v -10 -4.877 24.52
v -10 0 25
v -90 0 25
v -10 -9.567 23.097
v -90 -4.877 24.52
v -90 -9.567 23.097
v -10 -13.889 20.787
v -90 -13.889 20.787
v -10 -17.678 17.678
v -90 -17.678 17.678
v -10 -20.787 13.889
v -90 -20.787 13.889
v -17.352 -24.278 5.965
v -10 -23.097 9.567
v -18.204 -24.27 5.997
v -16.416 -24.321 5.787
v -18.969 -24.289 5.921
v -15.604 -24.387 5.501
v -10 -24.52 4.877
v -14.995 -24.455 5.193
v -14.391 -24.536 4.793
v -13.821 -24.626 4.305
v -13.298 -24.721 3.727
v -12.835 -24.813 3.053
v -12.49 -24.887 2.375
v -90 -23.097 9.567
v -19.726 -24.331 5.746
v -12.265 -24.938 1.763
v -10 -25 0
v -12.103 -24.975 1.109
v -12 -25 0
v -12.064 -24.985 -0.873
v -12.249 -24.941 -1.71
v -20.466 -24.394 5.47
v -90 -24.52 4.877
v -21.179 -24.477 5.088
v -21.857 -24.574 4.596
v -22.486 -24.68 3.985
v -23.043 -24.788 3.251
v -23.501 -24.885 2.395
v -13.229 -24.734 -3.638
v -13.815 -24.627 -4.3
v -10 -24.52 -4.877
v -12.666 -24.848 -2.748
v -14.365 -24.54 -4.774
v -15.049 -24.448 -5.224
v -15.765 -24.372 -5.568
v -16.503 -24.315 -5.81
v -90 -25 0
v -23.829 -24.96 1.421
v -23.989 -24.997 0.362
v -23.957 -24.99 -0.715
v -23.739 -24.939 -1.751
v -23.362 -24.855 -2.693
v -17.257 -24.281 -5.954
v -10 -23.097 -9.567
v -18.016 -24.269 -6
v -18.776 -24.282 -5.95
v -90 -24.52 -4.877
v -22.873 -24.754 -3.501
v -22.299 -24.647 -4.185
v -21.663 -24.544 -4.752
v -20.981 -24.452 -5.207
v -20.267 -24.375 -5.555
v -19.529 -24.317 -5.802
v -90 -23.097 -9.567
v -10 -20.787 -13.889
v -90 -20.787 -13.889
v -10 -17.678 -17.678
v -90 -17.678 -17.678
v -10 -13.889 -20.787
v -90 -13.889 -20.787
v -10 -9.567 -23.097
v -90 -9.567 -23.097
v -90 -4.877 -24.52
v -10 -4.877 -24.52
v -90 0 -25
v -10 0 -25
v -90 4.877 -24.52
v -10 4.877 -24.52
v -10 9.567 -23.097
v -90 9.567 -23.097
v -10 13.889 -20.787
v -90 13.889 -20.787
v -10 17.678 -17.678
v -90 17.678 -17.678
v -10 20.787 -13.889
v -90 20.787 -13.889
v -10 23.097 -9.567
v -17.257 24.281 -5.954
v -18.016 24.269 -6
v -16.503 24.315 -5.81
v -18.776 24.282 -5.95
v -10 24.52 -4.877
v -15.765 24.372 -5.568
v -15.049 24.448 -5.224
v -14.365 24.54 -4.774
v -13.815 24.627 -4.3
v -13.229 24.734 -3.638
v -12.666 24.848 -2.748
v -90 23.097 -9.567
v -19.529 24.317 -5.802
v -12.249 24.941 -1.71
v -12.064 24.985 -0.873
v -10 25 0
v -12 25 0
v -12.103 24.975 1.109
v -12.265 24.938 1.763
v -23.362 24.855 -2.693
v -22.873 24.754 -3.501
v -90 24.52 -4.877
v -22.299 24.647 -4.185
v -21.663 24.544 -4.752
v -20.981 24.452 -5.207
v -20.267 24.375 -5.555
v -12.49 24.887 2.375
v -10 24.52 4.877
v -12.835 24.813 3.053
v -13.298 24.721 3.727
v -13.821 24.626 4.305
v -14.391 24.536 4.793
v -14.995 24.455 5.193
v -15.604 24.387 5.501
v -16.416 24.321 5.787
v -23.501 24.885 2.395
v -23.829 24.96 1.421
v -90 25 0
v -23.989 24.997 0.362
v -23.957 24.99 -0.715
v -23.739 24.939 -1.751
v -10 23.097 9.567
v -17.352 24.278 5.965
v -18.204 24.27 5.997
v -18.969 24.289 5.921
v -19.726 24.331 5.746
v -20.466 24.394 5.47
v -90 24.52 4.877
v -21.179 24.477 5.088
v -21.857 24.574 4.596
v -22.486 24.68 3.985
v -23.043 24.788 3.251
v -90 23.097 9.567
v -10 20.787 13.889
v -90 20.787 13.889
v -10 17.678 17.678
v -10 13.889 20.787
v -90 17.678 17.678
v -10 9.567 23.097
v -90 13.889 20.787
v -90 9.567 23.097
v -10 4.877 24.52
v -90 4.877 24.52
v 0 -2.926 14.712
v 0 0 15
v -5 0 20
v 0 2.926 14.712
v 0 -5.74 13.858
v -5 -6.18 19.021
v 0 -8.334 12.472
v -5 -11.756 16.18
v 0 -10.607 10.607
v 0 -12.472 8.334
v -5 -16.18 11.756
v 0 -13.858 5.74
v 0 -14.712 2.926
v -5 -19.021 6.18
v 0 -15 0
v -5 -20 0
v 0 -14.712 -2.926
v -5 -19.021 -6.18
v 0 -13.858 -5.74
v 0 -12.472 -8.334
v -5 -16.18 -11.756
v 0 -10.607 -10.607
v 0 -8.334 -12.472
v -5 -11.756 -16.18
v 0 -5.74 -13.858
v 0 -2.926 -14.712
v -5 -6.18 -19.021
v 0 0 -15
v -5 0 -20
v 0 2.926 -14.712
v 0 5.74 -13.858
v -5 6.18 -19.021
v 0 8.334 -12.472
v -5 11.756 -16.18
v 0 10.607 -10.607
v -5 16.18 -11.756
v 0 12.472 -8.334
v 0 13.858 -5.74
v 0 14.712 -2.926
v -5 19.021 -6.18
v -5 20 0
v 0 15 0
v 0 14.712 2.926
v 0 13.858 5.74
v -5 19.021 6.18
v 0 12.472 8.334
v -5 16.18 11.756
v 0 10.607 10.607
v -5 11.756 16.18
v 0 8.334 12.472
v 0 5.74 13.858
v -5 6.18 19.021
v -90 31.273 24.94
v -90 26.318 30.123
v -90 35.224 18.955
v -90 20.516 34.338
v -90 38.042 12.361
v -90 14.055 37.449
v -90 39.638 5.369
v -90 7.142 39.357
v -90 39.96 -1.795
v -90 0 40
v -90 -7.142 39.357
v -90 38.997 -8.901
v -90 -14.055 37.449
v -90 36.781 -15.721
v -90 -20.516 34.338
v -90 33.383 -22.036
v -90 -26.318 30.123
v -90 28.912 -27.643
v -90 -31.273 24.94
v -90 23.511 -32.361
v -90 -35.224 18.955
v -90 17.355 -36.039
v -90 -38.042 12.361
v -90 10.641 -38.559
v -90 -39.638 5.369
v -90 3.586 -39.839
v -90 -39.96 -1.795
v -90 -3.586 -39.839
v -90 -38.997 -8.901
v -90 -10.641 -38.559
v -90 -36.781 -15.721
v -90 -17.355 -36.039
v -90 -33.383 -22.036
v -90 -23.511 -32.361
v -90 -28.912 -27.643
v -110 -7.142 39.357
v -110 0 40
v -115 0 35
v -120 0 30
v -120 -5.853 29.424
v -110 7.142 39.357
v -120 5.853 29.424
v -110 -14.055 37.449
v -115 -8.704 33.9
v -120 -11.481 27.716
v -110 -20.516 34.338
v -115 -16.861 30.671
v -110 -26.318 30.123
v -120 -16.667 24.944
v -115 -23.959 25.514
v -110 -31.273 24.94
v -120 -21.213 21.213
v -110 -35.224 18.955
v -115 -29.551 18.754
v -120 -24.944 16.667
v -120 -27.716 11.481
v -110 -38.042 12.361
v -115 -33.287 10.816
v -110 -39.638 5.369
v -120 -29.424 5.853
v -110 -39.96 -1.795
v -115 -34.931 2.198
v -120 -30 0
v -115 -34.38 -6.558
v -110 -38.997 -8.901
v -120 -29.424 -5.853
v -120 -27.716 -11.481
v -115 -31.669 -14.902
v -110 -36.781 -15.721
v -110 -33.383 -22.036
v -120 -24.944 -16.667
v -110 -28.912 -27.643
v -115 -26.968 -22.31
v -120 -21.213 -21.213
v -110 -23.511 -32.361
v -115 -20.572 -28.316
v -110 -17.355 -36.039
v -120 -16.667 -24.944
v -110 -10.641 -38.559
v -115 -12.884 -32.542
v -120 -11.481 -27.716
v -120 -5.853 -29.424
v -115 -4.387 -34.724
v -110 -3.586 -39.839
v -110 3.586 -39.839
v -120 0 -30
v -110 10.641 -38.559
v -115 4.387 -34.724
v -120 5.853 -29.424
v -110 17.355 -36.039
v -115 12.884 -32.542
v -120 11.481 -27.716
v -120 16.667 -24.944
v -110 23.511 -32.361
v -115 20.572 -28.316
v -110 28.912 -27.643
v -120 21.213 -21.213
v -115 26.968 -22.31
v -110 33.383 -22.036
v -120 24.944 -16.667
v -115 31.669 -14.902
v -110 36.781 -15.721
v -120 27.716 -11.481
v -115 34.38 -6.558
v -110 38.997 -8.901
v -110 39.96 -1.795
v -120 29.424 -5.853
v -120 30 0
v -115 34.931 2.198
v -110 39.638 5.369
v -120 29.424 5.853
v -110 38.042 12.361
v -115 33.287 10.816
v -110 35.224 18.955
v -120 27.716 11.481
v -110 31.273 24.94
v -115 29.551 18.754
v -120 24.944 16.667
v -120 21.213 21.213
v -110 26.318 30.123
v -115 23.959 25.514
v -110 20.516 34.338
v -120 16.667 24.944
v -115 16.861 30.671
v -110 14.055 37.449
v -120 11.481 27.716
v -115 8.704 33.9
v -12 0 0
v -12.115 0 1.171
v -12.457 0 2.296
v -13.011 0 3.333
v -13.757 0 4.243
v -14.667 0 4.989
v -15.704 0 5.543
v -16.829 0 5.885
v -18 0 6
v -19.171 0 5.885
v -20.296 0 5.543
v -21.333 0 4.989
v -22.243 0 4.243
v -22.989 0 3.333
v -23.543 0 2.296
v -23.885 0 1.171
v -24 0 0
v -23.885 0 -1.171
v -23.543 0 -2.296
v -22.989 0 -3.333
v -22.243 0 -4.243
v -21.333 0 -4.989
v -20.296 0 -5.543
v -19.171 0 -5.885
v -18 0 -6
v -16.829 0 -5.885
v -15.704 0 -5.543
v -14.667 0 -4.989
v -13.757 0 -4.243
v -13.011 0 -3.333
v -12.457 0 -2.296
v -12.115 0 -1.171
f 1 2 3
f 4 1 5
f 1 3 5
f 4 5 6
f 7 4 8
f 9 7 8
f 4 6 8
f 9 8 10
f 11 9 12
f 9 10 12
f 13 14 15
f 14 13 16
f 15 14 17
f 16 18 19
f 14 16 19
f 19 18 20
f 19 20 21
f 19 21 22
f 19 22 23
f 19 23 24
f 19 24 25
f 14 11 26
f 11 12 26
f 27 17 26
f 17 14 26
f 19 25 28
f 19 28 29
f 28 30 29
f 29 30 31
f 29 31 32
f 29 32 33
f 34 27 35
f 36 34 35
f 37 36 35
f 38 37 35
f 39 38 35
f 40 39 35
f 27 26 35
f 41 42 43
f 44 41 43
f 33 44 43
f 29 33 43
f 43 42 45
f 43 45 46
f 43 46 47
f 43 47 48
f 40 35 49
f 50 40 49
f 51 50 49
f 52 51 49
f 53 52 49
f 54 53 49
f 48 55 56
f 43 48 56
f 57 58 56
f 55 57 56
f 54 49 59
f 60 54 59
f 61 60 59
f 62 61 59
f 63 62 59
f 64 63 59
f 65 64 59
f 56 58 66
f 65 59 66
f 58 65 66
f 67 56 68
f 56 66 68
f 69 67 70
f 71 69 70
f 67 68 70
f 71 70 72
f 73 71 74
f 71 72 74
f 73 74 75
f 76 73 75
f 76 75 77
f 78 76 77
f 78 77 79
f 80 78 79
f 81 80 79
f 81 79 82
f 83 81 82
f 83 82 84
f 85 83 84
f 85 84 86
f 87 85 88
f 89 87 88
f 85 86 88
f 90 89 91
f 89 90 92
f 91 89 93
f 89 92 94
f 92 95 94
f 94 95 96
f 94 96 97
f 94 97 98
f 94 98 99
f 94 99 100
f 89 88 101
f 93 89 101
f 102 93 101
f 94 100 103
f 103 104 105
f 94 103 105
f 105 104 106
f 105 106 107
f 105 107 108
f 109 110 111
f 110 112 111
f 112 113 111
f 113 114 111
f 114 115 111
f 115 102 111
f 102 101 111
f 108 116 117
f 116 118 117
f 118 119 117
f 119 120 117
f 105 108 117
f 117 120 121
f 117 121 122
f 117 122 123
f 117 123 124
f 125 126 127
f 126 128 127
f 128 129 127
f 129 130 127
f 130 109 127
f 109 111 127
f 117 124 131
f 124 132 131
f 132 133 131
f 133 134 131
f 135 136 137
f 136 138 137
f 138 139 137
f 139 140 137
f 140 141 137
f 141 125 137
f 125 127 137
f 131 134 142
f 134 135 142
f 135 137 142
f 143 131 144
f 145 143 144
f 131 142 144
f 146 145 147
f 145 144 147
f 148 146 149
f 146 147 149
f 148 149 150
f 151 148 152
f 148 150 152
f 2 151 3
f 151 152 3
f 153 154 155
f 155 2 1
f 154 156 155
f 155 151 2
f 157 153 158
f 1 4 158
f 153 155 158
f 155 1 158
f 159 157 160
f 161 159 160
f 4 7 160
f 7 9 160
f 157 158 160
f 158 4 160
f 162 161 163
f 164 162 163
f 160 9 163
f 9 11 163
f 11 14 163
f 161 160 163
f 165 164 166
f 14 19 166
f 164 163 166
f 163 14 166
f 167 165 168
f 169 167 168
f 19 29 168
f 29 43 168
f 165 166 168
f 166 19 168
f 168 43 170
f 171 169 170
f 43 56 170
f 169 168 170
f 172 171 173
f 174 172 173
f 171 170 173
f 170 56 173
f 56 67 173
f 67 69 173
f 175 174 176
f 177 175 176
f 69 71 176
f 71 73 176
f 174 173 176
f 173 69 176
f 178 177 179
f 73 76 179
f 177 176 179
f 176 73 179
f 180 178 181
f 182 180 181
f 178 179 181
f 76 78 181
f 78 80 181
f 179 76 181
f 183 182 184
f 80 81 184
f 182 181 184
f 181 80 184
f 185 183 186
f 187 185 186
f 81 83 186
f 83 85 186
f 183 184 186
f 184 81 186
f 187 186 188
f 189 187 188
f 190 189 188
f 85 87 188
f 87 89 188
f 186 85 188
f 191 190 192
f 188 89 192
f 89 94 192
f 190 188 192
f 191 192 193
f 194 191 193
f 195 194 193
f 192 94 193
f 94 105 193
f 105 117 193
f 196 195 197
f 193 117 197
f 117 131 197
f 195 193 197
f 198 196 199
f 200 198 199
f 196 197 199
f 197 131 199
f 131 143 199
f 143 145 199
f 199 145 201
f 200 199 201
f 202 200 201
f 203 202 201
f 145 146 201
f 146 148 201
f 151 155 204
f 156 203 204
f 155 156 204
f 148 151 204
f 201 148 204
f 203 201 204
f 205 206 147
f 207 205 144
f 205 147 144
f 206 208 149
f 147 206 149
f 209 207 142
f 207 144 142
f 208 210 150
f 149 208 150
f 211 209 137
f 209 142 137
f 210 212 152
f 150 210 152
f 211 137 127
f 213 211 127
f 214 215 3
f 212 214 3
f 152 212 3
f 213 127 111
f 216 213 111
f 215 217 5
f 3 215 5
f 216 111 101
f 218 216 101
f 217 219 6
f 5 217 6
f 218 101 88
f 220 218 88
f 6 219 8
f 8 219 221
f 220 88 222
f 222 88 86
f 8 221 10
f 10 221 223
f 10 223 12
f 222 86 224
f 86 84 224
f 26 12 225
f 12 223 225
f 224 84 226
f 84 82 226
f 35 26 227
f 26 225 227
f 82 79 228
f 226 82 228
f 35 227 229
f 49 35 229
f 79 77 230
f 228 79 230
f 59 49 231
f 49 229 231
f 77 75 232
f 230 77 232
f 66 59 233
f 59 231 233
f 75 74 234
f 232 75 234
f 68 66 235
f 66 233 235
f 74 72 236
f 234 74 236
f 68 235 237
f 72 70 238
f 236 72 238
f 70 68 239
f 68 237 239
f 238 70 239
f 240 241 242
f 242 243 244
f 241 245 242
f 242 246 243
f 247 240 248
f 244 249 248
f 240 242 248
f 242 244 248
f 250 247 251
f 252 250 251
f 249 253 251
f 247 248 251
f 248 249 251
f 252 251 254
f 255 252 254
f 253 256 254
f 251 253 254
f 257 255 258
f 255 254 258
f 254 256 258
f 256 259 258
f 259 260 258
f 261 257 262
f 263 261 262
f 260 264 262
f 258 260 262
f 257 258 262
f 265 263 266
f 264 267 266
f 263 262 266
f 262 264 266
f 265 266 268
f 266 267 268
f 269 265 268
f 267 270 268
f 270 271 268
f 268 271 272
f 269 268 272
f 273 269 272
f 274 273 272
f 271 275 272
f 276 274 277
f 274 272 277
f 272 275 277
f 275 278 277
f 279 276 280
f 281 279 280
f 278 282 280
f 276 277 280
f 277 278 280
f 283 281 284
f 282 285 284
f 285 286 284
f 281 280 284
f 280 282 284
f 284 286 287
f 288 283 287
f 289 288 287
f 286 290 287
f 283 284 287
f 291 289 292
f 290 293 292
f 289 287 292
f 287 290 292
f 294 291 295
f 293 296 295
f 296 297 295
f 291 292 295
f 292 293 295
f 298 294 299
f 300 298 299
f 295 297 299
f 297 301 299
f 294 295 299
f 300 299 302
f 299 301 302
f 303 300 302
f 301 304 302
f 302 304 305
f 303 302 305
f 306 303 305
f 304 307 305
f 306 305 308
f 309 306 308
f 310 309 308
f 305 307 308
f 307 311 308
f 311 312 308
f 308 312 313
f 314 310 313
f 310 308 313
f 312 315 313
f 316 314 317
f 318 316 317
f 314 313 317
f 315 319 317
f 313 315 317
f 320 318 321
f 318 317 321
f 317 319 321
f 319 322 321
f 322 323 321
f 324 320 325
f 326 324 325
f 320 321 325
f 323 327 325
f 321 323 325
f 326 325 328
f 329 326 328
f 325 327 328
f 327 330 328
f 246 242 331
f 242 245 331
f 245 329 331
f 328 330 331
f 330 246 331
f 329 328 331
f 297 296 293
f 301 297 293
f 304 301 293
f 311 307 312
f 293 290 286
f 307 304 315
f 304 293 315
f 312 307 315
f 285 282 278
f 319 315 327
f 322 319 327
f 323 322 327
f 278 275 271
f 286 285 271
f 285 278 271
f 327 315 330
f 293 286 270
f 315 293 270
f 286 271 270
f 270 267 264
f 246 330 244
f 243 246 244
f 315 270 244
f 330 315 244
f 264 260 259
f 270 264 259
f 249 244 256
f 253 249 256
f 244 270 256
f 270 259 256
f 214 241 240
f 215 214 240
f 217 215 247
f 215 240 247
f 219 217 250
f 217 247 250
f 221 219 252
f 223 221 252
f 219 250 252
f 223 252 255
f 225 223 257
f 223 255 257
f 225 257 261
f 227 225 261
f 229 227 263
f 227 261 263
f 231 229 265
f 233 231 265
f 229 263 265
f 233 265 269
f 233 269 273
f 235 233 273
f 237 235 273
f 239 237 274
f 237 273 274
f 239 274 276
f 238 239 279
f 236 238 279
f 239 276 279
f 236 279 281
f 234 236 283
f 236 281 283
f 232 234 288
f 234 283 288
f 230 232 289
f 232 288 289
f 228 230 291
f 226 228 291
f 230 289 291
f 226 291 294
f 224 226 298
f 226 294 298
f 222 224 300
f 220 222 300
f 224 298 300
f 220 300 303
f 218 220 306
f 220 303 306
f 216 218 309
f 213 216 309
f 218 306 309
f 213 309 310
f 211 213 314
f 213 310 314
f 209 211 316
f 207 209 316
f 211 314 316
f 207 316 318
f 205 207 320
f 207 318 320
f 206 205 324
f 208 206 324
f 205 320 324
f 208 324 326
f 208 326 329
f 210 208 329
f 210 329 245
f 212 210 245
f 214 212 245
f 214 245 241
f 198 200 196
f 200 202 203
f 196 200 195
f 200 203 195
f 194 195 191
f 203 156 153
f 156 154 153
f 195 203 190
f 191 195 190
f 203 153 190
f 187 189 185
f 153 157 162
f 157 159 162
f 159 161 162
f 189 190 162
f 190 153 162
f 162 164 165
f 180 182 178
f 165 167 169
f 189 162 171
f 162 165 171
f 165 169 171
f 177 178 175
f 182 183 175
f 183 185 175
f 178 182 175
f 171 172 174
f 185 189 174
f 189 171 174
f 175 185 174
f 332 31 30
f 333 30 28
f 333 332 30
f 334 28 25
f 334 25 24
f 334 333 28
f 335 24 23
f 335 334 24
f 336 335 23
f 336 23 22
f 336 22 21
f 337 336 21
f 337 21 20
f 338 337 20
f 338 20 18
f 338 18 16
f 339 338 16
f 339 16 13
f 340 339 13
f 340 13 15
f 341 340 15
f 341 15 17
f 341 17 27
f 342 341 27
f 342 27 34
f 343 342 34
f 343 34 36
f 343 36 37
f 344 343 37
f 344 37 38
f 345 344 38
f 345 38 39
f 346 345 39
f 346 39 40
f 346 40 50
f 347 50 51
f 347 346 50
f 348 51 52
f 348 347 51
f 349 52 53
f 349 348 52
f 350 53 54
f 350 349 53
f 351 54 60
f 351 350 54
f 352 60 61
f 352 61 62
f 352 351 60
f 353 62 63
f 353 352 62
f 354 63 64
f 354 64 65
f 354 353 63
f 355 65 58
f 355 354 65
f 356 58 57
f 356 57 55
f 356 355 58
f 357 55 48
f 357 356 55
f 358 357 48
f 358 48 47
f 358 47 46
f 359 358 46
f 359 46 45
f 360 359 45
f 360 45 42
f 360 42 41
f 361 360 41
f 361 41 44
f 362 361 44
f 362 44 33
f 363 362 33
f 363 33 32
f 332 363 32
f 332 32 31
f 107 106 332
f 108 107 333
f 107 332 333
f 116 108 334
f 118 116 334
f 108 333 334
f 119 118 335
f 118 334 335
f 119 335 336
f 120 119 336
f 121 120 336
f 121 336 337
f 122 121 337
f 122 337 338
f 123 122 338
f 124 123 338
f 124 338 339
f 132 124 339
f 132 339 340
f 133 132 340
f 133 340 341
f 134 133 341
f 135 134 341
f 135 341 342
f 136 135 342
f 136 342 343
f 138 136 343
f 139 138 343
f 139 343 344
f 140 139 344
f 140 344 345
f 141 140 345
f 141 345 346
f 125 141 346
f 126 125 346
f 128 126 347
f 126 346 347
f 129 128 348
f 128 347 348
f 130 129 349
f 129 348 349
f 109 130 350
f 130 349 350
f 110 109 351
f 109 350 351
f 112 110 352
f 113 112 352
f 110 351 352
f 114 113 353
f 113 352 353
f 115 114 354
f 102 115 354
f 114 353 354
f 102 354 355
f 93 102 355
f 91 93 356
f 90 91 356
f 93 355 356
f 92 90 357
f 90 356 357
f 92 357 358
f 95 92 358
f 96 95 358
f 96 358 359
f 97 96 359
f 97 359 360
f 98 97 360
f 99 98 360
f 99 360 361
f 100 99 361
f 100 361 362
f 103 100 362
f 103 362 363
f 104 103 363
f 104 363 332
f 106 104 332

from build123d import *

# Parameters (mm, degrees)
F2_SIZE2      = 10
F2_SIZE       = 10
F3_R          = 6
F4_DEPTH      = 40.001
F4_DEPTH_BACK = 40.001


with BuildPart() as f1:
    # F0 (on Front) → F1 (revolve)
    with BuildSketch(Plane.XZ):
        Polygon((-120, 0), (0, 0), (0, 25), (-90, 25), (-90, 40), (-120, 40), align=None)
    revolve(axis=Axis((-60, 0, 0), (1, 0, 0)))

    # F2
    f2_edges = [f1.edges().sort_by_distance(p)[0] for p in [
        (-120, 0, -40),
        (0, 0, -25),
    ]]
    chamfer(f2_edges, length=F2_SIZE, length2=F2_SIZE2)

    # F3 (on Front) → F4 (cut, two sides)
    with BuildSketch(Plane.XZ) as f4_sk:
        with Locations((-18, 0)):
            Circle(F3_R)
    extrude(amount=-F4_DEPTH, mode=Mode.SUBTRACT)
    extrude(f4_sk.sketch, amount=F4_DEPTH_BACK, mode=Mode.SUBTRACT)


solid = f1.part
